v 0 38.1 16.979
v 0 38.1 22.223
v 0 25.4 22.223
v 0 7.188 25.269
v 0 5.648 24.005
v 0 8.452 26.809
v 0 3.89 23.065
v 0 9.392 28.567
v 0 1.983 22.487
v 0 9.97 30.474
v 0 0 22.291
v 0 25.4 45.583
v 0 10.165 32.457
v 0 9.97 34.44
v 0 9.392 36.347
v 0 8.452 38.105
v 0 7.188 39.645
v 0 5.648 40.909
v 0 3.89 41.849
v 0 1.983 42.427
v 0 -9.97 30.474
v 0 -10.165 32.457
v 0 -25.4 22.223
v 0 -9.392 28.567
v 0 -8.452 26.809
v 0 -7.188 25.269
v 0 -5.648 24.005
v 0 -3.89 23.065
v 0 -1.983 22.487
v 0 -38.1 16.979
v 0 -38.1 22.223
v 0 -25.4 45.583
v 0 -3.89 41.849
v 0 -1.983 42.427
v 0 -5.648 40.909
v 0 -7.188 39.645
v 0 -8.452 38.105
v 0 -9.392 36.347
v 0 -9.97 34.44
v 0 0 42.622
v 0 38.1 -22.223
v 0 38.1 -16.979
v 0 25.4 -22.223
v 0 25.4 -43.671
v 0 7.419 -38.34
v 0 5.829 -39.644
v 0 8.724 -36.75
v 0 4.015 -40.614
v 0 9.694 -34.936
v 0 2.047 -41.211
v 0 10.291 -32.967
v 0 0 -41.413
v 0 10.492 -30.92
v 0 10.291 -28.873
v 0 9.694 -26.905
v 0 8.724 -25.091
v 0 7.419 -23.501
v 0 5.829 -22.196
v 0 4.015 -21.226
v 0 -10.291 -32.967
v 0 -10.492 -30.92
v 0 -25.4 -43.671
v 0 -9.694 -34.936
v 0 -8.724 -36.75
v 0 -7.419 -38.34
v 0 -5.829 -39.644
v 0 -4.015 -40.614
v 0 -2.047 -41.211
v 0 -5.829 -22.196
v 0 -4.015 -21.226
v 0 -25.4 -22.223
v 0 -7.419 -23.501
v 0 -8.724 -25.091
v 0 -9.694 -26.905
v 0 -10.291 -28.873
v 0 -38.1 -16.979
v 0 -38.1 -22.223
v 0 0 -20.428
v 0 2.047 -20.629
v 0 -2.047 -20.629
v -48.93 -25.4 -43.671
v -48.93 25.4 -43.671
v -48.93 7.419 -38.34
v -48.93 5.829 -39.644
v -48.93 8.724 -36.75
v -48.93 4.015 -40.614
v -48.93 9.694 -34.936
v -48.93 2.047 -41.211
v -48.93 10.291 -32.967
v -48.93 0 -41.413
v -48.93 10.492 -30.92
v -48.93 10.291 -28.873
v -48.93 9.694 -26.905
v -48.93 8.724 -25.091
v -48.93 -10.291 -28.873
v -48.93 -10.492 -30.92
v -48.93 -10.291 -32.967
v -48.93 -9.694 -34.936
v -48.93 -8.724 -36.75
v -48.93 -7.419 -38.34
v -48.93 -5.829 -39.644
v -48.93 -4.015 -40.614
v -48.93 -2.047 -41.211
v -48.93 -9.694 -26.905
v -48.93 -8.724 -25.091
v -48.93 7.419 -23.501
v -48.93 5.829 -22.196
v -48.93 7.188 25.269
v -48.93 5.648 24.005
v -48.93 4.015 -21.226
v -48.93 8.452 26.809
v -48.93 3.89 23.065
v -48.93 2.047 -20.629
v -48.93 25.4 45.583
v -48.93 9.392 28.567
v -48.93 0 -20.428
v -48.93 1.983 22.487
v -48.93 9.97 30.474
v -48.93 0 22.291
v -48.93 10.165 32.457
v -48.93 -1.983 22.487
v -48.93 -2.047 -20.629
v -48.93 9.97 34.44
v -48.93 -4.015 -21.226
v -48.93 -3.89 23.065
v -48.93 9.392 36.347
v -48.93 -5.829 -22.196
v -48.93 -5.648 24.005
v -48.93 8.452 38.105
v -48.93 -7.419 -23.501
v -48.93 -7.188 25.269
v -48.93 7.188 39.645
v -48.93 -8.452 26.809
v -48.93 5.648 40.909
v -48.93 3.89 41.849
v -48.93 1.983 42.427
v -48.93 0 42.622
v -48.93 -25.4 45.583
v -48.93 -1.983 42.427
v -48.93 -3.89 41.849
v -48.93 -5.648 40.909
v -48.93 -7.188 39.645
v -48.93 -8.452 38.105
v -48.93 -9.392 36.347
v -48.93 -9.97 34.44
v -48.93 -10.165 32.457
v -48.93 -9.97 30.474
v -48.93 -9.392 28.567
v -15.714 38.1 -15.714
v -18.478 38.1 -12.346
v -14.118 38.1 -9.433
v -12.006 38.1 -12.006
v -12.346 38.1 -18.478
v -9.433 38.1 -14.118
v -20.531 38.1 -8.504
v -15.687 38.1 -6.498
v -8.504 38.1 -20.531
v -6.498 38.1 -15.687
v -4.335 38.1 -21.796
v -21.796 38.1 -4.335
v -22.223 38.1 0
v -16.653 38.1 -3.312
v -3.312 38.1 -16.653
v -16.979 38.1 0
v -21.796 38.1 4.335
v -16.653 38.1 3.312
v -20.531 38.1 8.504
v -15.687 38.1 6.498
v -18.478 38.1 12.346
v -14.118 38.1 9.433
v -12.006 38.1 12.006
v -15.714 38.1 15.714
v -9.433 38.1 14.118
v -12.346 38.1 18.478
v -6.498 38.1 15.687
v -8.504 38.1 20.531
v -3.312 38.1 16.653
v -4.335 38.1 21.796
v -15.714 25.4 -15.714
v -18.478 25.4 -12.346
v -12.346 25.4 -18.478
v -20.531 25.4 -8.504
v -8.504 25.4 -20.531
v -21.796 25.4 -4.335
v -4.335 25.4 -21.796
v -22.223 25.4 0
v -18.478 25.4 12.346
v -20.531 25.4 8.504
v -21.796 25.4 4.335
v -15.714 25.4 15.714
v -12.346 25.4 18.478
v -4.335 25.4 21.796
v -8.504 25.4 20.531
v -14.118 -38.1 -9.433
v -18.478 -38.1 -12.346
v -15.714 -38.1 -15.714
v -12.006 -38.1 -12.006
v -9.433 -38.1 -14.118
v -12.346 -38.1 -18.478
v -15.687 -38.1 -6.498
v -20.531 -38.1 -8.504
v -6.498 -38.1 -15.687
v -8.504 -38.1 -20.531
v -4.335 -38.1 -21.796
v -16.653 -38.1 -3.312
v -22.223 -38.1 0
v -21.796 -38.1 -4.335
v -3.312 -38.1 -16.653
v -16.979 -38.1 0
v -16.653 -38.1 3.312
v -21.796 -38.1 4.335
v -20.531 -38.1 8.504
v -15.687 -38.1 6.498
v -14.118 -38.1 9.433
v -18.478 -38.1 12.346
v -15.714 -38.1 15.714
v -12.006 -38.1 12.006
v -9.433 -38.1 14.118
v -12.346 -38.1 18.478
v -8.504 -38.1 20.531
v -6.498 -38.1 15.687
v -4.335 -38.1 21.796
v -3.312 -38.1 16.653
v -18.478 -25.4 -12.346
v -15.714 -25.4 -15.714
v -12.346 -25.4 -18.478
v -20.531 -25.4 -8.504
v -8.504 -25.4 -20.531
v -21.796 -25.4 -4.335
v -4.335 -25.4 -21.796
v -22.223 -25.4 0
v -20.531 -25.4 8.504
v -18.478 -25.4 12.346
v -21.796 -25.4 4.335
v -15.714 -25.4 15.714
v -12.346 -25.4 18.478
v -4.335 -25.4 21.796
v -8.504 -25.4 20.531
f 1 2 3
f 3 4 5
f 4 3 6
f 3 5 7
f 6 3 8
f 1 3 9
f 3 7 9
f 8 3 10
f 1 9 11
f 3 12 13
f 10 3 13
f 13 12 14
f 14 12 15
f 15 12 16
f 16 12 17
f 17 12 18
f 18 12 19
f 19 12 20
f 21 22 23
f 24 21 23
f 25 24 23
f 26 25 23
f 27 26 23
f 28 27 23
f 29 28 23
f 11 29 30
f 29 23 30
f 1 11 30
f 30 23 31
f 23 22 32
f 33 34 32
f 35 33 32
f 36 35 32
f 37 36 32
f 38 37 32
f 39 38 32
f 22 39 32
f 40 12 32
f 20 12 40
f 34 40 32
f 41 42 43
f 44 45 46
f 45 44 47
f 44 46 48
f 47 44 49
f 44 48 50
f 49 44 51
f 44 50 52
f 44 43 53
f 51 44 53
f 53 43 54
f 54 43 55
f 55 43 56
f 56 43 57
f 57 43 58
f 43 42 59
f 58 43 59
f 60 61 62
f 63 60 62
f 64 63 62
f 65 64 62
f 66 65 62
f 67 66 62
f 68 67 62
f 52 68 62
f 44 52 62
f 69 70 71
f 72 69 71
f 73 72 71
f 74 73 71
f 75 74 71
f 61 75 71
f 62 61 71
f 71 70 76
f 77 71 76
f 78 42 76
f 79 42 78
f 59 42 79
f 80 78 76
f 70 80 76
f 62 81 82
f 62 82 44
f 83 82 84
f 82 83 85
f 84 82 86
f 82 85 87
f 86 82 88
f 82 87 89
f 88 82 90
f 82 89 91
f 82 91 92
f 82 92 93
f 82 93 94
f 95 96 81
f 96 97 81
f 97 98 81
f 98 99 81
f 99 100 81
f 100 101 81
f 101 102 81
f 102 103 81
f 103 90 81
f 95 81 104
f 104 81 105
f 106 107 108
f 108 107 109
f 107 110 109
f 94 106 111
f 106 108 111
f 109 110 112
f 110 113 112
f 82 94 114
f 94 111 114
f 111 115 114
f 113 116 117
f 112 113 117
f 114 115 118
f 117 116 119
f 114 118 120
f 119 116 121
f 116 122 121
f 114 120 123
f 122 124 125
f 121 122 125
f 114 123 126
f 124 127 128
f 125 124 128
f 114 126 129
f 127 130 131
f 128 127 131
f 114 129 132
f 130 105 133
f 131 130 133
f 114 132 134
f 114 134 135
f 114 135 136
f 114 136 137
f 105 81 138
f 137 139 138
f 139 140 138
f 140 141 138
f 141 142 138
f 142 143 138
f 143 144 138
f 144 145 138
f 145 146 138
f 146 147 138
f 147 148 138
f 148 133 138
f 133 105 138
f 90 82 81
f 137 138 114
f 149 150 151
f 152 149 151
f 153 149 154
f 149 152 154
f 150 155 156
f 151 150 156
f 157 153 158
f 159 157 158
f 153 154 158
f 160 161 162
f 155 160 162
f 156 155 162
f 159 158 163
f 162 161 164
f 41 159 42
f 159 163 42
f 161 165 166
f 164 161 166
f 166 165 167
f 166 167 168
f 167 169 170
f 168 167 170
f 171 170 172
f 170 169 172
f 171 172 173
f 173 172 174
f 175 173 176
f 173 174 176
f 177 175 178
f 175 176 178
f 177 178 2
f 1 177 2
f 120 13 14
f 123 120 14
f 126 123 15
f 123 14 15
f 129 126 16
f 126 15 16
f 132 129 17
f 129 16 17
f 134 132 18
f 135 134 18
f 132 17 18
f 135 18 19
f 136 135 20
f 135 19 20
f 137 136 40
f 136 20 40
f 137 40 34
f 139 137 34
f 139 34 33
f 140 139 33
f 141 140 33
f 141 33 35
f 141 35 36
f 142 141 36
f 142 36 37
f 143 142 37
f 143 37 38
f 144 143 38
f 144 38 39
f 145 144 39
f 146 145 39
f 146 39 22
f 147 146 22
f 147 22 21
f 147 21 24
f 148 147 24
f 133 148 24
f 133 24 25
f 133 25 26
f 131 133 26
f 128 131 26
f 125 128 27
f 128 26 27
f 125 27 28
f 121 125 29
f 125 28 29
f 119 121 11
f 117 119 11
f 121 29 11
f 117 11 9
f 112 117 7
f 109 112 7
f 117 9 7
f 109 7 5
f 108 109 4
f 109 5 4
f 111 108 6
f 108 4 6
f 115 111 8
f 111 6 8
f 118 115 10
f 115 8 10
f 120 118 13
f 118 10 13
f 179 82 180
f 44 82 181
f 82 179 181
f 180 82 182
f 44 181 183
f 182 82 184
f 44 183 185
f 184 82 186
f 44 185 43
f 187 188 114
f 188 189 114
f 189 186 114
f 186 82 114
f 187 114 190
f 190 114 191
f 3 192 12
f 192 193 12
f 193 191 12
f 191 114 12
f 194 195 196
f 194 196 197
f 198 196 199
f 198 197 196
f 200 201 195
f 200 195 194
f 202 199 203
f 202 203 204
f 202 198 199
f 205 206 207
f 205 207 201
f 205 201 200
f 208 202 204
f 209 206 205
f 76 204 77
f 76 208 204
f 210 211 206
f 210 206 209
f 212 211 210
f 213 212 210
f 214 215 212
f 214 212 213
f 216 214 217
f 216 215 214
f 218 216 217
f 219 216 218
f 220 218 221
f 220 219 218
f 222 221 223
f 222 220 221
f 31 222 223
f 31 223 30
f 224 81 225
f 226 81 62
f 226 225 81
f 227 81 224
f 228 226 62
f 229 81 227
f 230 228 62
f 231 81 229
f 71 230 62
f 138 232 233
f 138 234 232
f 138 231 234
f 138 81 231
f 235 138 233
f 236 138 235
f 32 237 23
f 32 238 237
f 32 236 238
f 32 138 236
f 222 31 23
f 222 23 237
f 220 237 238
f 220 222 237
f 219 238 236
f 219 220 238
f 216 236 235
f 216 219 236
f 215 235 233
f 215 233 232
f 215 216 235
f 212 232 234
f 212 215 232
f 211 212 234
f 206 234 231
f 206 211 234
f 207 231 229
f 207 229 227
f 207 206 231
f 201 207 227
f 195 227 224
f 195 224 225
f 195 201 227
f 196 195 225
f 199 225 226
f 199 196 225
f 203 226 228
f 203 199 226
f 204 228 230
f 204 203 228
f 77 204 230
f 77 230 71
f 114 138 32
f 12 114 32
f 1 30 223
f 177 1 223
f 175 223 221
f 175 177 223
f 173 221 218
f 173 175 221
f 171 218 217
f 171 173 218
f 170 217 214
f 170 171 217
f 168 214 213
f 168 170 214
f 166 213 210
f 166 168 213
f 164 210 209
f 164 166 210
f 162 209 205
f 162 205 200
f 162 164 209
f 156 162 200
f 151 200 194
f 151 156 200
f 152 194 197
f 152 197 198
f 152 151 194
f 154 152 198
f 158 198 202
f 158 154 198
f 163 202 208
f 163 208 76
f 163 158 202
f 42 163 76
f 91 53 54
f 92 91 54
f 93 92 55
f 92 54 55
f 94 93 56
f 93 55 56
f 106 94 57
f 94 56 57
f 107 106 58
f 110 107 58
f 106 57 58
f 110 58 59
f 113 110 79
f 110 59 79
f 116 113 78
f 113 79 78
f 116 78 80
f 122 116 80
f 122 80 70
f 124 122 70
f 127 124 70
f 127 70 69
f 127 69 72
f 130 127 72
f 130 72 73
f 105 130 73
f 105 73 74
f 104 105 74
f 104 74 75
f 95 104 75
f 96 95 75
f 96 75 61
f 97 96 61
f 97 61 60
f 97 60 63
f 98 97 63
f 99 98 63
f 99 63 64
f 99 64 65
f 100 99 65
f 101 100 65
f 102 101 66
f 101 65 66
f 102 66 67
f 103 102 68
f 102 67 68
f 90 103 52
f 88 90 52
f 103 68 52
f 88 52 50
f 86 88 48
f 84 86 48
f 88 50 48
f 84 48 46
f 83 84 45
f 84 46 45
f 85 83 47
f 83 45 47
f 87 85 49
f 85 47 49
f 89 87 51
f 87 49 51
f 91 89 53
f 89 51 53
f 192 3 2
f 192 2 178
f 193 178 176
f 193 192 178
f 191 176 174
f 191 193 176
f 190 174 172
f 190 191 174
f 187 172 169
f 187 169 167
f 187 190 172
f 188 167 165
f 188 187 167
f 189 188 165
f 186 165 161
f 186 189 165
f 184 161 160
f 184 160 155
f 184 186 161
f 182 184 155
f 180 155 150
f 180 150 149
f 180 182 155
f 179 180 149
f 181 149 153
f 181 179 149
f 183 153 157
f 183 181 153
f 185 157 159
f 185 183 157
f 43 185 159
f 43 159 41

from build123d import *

# Parameters (mm, degrees)
F0_W     = 95.948249
F0_H     = 89.254186
F0_R     = 22.222856
F1_DEPTH = 25.4
F0_R_2   = 16.979285
F2_DEPTH = 38.1
F4_DEPTH = 558.8
F5_R     = 10.492491
F5_R_2   = 10.165453
F6_DEPTH = 48.931418


with BuildPart() as f1:
    # F0 (on Front) → F1 (new body, symmetric)
    with BuildSketch(Plane.XZ):
        with Locations((-0.956293, 0.956297)):
            Rectangle(F0_W, F0_H)
        Circle(F0_R, mode=Mode.SUBTRACT)
    extrude(amount=F1_DEPTH, both=True)

    # F0 (on Front) → F2 (join, symmetric)
    with BuildSketch(Plane.XZ):
        Circle(F0_R)
        Circle(F0_R_2, mode=Mode.SUBTRACT)
    extrude(amount=F2_DEPTH, both=True)

    # F3 (on Top) → F4 (cut, symmetric)
    with BuildSketch(Plane.XY):
        Polygon((0, 50.046094), (0, -54.508805), (60.724724, -51.321156), (64.549901, 41.439444), align=None)
    extrude(amount=F4_DEPTH, both=True, mode=Mode.SUBTRACT)

    # F5 (on Right) → F6 (cut, through all)
    with BuildSketch(Plane.YZ):
        with Locations((0, -30.9202)):
            Circle(F5_R)
        with Locations((0, 32.45692)):
            Circle(F5_R_2)
    extrude(amount=-F6_DEPTH, mode=Mode.SUBTRACT)


solid = f1.part
